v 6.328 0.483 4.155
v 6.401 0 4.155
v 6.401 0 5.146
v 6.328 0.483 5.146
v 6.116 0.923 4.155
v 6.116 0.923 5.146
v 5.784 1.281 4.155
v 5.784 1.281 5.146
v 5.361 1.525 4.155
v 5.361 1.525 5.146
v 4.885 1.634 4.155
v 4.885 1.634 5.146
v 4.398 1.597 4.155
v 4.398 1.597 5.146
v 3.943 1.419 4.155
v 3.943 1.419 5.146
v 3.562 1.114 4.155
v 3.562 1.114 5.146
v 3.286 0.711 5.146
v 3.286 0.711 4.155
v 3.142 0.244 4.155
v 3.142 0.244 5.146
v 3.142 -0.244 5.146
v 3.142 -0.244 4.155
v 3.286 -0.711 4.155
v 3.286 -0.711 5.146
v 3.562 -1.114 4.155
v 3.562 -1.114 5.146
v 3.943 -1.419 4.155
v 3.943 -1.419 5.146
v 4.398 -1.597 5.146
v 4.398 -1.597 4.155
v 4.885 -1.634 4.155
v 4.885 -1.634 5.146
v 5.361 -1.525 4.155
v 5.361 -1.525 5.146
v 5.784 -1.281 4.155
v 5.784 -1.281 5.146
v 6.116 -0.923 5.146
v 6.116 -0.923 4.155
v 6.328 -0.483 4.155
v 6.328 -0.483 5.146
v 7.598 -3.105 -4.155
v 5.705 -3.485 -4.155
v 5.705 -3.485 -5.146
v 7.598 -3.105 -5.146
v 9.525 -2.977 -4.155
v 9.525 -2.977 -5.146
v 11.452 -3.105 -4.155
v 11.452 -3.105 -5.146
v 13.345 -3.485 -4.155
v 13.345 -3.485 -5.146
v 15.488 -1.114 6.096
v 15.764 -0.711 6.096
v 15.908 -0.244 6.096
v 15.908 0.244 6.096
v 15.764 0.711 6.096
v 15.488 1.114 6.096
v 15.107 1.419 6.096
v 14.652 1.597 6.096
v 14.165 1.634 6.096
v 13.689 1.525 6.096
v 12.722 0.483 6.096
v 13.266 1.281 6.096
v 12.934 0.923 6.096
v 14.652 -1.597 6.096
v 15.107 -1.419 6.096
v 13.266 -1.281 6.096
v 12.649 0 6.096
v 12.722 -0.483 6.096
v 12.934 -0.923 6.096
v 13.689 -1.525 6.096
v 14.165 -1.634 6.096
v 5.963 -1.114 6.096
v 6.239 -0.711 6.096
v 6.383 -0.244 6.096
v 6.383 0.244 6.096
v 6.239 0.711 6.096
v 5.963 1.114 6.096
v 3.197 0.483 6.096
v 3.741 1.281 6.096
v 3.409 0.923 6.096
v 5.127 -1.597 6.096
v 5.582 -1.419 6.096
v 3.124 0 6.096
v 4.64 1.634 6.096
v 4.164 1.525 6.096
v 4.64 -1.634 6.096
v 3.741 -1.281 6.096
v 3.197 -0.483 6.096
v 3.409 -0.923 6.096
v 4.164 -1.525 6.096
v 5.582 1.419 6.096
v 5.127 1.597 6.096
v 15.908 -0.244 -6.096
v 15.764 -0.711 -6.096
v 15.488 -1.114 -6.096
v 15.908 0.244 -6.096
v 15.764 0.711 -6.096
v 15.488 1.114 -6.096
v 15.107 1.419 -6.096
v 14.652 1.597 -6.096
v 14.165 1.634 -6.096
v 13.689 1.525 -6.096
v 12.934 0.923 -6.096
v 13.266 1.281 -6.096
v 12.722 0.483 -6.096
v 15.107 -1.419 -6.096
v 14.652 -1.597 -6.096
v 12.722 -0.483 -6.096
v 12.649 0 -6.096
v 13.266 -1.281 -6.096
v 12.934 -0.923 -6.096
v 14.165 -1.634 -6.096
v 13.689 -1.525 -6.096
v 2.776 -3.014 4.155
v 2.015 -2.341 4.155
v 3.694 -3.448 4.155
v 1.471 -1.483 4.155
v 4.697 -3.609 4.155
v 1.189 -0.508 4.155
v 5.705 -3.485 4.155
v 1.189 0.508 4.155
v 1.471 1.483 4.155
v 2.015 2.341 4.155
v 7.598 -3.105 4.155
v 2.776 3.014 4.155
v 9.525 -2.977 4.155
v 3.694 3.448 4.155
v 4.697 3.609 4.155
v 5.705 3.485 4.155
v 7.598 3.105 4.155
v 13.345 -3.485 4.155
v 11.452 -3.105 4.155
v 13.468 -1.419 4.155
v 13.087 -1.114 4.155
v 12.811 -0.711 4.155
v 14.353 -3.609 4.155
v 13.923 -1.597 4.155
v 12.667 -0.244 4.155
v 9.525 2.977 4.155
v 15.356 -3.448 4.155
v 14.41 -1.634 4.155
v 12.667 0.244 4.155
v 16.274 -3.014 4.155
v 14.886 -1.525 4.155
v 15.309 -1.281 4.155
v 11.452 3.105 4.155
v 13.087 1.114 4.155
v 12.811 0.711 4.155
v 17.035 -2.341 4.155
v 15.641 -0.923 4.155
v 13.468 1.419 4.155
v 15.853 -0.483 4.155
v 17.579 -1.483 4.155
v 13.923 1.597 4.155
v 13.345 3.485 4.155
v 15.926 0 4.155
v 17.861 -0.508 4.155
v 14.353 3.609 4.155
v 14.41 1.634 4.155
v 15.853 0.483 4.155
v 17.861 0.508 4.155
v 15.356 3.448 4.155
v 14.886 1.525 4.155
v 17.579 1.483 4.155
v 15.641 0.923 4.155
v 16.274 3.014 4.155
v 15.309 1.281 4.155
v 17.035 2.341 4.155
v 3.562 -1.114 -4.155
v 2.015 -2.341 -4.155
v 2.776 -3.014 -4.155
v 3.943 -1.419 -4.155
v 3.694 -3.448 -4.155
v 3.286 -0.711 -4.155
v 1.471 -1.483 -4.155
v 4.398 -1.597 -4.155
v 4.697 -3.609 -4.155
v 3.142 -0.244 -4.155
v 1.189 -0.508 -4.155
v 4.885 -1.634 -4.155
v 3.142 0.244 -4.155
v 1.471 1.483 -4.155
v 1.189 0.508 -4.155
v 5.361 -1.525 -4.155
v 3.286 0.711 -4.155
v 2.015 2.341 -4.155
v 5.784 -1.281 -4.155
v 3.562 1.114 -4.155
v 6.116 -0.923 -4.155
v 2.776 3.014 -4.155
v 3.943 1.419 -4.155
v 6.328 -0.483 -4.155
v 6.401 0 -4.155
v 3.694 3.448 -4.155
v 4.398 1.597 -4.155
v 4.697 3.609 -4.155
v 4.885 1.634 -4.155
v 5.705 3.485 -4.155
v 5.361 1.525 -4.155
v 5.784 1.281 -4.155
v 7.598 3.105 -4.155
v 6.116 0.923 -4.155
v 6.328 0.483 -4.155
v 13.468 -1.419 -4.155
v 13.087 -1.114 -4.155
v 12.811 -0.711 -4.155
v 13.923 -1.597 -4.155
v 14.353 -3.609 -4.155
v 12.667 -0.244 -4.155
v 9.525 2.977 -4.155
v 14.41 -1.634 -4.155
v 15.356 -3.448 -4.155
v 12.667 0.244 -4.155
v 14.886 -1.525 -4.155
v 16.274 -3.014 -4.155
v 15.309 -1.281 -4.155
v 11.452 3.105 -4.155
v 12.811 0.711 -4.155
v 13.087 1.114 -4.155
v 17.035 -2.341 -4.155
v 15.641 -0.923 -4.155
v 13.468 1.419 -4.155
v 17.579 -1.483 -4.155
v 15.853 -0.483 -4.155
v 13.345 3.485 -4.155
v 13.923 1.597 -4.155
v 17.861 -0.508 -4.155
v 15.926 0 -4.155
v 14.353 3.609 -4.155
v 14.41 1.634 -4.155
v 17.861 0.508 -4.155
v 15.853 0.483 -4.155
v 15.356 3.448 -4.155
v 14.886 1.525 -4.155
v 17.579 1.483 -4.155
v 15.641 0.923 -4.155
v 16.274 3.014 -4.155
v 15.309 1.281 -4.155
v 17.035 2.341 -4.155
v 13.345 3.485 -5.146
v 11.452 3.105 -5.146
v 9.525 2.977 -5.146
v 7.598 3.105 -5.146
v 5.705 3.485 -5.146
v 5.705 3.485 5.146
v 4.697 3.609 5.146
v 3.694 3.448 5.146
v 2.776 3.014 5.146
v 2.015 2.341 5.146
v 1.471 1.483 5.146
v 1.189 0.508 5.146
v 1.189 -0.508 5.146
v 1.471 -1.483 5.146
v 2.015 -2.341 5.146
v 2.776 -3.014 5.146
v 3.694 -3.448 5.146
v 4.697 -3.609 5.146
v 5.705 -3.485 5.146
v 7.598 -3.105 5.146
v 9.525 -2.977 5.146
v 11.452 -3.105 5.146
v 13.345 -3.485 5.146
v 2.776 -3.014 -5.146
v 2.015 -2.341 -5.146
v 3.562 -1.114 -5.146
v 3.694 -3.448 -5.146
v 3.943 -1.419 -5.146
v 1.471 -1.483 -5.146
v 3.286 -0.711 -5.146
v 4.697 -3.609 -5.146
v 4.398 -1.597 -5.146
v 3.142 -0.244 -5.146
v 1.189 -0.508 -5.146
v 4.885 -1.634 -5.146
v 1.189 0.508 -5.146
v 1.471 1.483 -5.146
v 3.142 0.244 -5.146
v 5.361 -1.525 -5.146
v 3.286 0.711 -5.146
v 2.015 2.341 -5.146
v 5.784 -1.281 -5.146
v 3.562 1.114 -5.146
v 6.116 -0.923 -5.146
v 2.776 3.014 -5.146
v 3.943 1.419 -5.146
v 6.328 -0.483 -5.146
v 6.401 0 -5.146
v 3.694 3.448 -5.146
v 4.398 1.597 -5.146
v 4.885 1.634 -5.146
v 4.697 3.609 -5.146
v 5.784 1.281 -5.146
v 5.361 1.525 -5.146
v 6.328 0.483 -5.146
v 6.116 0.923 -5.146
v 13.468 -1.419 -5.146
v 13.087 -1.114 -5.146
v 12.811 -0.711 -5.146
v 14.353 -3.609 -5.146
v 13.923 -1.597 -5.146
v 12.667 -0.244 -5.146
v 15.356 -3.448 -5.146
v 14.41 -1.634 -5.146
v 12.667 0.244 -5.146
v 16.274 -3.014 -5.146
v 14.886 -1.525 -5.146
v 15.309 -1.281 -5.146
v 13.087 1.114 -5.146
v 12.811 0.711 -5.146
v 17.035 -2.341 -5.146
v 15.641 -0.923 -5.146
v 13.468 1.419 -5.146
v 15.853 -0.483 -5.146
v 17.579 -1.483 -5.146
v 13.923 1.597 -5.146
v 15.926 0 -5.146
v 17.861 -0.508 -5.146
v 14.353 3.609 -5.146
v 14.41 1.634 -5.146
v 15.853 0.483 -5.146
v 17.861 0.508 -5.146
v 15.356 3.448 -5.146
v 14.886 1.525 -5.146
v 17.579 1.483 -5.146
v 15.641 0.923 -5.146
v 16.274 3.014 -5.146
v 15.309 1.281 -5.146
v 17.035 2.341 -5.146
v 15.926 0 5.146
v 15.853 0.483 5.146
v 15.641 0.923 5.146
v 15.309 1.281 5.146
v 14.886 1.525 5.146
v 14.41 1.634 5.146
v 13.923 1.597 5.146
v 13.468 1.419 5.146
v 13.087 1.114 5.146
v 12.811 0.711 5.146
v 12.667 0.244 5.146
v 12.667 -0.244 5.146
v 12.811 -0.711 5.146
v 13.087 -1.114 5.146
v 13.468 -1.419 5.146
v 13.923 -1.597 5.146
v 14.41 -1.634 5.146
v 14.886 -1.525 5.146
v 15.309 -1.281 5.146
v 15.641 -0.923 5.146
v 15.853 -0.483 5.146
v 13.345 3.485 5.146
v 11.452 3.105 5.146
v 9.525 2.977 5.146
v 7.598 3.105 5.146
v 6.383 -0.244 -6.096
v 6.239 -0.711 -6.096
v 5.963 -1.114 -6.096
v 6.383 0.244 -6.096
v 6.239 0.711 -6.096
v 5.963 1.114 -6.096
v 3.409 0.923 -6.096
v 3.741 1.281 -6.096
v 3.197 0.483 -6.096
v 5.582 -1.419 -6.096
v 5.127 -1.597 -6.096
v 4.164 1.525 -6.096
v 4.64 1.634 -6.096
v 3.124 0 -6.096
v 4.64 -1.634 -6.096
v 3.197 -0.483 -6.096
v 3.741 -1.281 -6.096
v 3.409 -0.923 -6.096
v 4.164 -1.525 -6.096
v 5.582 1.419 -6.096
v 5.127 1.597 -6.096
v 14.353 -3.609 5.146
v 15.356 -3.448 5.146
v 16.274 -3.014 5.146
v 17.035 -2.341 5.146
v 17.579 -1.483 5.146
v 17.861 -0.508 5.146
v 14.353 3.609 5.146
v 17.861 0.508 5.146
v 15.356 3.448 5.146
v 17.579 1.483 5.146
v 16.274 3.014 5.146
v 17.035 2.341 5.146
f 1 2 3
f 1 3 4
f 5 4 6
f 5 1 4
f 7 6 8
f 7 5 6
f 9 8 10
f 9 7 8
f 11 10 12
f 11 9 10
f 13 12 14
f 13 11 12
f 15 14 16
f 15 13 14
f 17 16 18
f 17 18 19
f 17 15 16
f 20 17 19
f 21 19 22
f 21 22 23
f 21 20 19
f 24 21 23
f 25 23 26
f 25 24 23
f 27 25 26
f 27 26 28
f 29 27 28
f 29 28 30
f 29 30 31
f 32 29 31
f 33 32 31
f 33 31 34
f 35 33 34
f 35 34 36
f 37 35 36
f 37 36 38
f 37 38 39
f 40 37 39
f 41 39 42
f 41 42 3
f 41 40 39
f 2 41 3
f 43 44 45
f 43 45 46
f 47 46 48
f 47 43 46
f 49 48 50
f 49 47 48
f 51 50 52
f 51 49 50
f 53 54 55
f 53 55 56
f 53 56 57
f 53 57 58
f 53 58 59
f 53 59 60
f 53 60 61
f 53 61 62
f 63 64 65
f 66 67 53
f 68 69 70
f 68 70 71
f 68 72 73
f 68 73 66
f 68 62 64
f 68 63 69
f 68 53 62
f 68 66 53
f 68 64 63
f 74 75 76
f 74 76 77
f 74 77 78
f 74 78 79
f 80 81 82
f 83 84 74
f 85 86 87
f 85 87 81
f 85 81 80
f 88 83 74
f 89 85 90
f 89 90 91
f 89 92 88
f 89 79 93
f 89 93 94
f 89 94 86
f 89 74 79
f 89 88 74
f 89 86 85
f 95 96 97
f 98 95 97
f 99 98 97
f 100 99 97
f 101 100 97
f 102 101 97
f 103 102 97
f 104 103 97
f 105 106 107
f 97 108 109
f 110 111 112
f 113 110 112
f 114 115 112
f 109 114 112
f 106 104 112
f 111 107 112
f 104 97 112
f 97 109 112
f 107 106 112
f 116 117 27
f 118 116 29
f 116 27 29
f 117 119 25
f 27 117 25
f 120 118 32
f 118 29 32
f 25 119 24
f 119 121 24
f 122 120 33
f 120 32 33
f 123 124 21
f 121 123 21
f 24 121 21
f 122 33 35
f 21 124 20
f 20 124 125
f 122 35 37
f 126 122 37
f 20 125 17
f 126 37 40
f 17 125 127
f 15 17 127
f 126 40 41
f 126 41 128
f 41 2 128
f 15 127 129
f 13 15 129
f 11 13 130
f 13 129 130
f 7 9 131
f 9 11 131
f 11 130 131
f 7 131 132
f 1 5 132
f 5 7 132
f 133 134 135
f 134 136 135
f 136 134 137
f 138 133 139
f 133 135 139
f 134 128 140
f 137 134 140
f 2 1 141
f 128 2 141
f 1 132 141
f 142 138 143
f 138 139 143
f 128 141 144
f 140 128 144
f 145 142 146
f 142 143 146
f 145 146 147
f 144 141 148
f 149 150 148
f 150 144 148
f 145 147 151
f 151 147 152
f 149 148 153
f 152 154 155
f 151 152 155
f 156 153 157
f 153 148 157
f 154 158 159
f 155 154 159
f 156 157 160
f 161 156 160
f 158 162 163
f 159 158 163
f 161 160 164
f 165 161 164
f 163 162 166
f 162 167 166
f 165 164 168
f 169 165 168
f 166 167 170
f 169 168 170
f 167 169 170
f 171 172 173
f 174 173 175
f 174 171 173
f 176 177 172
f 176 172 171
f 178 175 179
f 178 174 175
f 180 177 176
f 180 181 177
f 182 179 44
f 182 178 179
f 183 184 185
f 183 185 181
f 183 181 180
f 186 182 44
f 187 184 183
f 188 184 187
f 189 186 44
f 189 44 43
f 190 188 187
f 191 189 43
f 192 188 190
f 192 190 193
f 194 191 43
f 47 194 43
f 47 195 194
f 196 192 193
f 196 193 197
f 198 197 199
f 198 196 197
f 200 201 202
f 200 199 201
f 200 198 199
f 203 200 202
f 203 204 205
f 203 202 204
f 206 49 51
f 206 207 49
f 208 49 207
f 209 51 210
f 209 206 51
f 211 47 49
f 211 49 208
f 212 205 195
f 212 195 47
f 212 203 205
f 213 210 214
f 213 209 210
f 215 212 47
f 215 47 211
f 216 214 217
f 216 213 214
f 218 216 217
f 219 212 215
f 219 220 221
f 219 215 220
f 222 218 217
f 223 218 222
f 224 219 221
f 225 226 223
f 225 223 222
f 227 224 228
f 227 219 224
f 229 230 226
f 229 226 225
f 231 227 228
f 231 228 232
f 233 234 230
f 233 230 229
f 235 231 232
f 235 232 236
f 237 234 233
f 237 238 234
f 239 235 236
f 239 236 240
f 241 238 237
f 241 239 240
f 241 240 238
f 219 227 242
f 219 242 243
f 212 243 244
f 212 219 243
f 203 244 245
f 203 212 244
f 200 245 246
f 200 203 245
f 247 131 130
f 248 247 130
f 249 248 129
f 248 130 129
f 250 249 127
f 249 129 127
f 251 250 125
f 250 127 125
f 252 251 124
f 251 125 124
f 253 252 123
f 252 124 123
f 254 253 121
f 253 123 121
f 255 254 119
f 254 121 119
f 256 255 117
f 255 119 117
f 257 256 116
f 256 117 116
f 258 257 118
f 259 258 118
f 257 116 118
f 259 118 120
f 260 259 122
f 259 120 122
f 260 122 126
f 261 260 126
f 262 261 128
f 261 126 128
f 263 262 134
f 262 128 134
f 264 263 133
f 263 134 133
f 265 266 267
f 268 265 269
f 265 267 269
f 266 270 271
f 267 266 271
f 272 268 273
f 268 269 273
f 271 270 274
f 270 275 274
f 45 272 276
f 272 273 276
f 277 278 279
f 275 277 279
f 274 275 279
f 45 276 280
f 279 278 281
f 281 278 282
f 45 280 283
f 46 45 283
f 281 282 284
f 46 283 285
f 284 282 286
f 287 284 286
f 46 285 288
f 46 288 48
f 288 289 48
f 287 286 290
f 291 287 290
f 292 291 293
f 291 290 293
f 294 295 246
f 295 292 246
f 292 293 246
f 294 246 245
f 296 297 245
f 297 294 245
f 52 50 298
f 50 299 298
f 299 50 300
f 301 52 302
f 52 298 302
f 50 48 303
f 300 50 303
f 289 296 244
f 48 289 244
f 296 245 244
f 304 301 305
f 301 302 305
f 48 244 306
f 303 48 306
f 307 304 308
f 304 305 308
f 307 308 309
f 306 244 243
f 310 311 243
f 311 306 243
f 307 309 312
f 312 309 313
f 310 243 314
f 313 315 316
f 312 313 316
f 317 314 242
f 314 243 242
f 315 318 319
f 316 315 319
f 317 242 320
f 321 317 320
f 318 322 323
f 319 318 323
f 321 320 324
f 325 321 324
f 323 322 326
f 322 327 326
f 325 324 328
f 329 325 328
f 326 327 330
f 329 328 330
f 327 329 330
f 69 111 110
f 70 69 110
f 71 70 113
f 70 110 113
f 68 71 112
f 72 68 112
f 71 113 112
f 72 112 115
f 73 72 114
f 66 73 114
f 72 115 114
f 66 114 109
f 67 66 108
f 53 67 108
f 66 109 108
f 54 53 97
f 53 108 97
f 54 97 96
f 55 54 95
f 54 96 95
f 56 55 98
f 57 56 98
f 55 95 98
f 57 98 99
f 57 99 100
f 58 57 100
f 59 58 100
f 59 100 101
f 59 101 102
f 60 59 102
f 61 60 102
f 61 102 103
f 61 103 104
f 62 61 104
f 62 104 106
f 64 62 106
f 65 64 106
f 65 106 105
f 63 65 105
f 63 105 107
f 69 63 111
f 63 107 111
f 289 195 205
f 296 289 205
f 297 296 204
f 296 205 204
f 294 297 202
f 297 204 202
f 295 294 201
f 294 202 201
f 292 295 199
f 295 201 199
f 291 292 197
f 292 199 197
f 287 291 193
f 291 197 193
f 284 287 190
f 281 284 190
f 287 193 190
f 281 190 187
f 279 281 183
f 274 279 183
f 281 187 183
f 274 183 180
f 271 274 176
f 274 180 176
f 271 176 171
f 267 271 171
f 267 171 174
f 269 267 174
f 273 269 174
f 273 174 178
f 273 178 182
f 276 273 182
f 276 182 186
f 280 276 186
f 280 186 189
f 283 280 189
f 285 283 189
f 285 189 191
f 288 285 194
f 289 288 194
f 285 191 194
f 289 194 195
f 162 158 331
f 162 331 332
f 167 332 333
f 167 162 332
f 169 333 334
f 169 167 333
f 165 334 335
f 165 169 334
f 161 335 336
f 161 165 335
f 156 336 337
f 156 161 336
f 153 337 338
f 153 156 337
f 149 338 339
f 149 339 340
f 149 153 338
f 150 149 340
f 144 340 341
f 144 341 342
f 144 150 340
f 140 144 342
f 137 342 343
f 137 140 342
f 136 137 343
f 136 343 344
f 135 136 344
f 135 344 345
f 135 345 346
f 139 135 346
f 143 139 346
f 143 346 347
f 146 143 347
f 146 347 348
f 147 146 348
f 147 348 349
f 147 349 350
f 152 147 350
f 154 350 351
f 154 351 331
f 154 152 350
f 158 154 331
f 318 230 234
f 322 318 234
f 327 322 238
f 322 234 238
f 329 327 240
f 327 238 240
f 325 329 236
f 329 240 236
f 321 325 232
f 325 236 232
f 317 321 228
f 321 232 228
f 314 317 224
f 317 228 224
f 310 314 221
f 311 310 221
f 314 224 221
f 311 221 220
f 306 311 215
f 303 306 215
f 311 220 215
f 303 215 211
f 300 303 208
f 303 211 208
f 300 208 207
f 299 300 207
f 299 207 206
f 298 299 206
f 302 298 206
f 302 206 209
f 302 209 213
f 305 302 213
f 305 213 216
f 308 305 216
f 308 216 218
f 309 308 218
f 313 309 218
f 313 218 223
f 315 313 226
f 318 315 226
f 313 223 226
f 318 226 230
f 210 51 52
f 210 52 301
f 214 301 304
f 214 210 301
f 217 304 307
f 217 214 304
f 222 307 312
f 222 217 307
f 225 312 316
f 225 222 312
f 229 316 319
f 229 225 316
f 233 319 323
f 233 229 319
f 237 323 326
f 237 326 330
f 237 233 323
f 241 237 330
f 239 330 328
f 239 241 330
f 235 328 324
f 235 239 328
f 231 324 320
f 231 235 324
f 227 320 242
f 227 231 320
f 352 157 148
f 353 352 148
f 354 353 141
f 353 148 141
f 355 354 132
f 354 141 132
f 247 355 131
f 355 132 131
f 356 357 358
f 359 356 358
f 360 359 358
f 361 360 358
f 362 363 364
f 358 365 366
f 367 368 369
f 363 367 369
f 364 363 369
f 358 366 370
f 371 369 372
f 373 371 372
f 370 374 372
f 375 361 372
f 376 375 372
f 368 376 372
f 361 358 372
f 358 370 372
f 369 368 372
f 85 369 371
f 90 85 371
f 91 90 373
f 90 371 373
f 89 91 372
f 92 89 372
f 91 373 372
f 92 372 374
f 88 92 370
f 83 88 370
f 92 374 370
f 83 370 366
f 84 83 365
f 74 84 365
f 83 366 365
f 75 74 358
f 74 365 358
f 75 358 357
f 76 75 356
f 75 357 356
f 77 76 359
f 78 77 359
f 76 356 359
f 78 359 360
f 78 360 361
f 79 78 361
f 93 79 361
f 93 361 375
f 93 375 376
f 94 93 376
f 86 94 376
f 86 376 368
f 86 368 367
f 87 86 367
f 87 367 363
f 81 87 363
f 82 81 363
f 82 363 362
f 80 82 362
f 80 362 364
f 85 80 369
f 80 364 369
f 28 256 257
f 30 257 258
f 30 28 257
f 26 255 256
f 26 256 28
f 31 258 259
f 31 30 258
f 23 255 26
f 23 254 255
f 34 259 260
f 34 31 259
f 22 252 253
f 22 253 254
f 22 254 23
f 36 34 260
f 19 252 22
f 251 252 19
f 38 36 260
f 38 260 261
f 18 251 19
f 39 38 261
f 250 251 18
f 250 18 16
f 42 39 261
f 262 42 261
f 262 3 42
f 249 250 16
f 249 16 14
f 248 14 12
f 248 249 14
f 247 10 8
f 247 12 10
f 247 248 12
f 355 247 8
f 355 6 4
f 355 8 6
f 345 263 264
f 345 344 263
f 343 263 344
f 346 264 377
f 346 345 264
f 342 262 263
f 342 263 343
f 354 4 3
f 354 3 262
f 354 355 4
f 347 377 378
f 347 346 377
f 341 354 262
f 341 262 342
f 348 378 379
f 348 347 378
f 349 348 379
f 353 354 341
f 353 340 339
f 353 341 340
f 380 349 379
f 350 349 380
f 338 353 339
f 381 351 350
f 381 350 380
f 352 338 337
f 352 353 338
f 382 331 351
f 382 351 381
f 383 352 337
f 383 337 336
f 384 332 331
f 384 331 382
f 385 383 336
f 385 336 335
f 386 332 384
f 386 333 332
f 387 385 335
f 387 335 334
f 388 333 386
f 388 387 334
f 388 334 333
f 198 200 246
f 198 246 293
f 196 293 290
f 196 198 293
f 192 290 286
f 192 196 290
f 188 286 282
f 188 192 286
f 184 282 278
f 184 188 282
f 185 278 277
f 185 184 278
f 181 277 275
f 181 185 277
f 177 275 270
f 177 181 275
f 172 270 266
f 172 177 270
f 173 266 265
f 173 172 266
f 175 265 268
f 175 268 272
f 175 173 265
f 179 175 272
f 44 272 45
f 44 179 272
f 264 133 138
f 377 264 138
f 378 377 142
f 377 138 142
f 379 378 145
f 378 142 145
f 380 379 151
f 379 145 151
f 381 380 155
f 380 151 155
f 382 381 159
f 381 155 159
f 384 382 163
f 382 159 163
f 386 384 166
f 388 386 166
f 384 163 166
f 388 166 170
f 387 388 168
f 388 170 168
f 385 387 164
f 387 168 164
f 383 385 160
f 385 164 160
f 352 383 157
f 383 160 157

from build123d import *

# Parameters (mm, degrees)
SKETCH7_R                  = 1.6383
BOSS_EXTRUDE3_DEPTH        = 0.9906
BOSS_EXTRUDE4_DEPTH        = 6.096
BOSS_EXTRUDE4_DEPTH_BACK   = 6.096
SKETCH8_R                  = 1.6383
BOSS_EXTRUDE4_2_DEPTH      = 6.096
BOSS_EXTRUDE4_2_DEPTH_BACK = 6.096


with BuildPart() as part:
    # Sketch7 → Boss-Extrude3 (new body)
    with BuildSketch(Plane.XY.offset(-4.1554)):
        with BuildLine():
            ThreePointArc((5.704721623, 3.48471247), (1.152652, 0), (5.704721623, -3.48471247))
            ThreePointArc((5.704721623, -3.48471247), (9.525, -2.977345042), (13.345278377, -3.48471247))
            ThreePointArc((13.345278377, -3.48471247), (17.897348, 0), (13.345278377, 3.48471247))
            ThreePointArc((13.345278377, 3.48471247), (9.525, 2.977345042), (5.704721623, 3.48471247))
        make_face()
        with Locations((4.7625, 0)):
            Circle(SKETCH7_R, mode=Mode.SUBTRACT)
        with Locations((14.2875, 0)):
            Circle(SKETCH7_R, mode=Mode.SUBTRACT)
    extrude(amount=-BOSS_EXTRUDE3_DEPTH)


with BuildPart() as body_2:
    # Mirror1: mirrored copy
    add(part.part.mirror(Plane.XY))


with BuildPart() as body_3:
    # Sketch8 → Boss-Extrude4 (new, two sides: drawn at the far end of the back side and taken through both)
    with BuildSketch(Plane.XY.offset(-BOSS_EXTRUDE4_DEPTH_BACK)):
        with Locations(Location((4.7625, 0, 0), (0, 0, 180))):
            Circle(SKETCH8_R)
    extrude(amount=BOSS_EXTRUDE4_DEPTH + BOSS_EXTRUDE4_DEPTH_BACK)


with BuildPart() as body_4:
    # Sketch8 → Boss-Extrude4 2 (new, two sides: drawn at the far end of the back side and taken through both)
    with BuildSketch(Plane.XY.offset(-BOSS_EXTRUDE4_2_DEPTH_BACK)):
        with Locations(Location((14.2875, 0, 0), (0, 0, 180))):
            Circle(SKETCH8_R)
    extrude(amount=BOSS_EXTRUDE4_2_DEPTH + BOSS_EXTRUDE4_2_DEPTH_BACK)


solid = Compound([part.part, body_2.part, body_3.part, body_4.part])
